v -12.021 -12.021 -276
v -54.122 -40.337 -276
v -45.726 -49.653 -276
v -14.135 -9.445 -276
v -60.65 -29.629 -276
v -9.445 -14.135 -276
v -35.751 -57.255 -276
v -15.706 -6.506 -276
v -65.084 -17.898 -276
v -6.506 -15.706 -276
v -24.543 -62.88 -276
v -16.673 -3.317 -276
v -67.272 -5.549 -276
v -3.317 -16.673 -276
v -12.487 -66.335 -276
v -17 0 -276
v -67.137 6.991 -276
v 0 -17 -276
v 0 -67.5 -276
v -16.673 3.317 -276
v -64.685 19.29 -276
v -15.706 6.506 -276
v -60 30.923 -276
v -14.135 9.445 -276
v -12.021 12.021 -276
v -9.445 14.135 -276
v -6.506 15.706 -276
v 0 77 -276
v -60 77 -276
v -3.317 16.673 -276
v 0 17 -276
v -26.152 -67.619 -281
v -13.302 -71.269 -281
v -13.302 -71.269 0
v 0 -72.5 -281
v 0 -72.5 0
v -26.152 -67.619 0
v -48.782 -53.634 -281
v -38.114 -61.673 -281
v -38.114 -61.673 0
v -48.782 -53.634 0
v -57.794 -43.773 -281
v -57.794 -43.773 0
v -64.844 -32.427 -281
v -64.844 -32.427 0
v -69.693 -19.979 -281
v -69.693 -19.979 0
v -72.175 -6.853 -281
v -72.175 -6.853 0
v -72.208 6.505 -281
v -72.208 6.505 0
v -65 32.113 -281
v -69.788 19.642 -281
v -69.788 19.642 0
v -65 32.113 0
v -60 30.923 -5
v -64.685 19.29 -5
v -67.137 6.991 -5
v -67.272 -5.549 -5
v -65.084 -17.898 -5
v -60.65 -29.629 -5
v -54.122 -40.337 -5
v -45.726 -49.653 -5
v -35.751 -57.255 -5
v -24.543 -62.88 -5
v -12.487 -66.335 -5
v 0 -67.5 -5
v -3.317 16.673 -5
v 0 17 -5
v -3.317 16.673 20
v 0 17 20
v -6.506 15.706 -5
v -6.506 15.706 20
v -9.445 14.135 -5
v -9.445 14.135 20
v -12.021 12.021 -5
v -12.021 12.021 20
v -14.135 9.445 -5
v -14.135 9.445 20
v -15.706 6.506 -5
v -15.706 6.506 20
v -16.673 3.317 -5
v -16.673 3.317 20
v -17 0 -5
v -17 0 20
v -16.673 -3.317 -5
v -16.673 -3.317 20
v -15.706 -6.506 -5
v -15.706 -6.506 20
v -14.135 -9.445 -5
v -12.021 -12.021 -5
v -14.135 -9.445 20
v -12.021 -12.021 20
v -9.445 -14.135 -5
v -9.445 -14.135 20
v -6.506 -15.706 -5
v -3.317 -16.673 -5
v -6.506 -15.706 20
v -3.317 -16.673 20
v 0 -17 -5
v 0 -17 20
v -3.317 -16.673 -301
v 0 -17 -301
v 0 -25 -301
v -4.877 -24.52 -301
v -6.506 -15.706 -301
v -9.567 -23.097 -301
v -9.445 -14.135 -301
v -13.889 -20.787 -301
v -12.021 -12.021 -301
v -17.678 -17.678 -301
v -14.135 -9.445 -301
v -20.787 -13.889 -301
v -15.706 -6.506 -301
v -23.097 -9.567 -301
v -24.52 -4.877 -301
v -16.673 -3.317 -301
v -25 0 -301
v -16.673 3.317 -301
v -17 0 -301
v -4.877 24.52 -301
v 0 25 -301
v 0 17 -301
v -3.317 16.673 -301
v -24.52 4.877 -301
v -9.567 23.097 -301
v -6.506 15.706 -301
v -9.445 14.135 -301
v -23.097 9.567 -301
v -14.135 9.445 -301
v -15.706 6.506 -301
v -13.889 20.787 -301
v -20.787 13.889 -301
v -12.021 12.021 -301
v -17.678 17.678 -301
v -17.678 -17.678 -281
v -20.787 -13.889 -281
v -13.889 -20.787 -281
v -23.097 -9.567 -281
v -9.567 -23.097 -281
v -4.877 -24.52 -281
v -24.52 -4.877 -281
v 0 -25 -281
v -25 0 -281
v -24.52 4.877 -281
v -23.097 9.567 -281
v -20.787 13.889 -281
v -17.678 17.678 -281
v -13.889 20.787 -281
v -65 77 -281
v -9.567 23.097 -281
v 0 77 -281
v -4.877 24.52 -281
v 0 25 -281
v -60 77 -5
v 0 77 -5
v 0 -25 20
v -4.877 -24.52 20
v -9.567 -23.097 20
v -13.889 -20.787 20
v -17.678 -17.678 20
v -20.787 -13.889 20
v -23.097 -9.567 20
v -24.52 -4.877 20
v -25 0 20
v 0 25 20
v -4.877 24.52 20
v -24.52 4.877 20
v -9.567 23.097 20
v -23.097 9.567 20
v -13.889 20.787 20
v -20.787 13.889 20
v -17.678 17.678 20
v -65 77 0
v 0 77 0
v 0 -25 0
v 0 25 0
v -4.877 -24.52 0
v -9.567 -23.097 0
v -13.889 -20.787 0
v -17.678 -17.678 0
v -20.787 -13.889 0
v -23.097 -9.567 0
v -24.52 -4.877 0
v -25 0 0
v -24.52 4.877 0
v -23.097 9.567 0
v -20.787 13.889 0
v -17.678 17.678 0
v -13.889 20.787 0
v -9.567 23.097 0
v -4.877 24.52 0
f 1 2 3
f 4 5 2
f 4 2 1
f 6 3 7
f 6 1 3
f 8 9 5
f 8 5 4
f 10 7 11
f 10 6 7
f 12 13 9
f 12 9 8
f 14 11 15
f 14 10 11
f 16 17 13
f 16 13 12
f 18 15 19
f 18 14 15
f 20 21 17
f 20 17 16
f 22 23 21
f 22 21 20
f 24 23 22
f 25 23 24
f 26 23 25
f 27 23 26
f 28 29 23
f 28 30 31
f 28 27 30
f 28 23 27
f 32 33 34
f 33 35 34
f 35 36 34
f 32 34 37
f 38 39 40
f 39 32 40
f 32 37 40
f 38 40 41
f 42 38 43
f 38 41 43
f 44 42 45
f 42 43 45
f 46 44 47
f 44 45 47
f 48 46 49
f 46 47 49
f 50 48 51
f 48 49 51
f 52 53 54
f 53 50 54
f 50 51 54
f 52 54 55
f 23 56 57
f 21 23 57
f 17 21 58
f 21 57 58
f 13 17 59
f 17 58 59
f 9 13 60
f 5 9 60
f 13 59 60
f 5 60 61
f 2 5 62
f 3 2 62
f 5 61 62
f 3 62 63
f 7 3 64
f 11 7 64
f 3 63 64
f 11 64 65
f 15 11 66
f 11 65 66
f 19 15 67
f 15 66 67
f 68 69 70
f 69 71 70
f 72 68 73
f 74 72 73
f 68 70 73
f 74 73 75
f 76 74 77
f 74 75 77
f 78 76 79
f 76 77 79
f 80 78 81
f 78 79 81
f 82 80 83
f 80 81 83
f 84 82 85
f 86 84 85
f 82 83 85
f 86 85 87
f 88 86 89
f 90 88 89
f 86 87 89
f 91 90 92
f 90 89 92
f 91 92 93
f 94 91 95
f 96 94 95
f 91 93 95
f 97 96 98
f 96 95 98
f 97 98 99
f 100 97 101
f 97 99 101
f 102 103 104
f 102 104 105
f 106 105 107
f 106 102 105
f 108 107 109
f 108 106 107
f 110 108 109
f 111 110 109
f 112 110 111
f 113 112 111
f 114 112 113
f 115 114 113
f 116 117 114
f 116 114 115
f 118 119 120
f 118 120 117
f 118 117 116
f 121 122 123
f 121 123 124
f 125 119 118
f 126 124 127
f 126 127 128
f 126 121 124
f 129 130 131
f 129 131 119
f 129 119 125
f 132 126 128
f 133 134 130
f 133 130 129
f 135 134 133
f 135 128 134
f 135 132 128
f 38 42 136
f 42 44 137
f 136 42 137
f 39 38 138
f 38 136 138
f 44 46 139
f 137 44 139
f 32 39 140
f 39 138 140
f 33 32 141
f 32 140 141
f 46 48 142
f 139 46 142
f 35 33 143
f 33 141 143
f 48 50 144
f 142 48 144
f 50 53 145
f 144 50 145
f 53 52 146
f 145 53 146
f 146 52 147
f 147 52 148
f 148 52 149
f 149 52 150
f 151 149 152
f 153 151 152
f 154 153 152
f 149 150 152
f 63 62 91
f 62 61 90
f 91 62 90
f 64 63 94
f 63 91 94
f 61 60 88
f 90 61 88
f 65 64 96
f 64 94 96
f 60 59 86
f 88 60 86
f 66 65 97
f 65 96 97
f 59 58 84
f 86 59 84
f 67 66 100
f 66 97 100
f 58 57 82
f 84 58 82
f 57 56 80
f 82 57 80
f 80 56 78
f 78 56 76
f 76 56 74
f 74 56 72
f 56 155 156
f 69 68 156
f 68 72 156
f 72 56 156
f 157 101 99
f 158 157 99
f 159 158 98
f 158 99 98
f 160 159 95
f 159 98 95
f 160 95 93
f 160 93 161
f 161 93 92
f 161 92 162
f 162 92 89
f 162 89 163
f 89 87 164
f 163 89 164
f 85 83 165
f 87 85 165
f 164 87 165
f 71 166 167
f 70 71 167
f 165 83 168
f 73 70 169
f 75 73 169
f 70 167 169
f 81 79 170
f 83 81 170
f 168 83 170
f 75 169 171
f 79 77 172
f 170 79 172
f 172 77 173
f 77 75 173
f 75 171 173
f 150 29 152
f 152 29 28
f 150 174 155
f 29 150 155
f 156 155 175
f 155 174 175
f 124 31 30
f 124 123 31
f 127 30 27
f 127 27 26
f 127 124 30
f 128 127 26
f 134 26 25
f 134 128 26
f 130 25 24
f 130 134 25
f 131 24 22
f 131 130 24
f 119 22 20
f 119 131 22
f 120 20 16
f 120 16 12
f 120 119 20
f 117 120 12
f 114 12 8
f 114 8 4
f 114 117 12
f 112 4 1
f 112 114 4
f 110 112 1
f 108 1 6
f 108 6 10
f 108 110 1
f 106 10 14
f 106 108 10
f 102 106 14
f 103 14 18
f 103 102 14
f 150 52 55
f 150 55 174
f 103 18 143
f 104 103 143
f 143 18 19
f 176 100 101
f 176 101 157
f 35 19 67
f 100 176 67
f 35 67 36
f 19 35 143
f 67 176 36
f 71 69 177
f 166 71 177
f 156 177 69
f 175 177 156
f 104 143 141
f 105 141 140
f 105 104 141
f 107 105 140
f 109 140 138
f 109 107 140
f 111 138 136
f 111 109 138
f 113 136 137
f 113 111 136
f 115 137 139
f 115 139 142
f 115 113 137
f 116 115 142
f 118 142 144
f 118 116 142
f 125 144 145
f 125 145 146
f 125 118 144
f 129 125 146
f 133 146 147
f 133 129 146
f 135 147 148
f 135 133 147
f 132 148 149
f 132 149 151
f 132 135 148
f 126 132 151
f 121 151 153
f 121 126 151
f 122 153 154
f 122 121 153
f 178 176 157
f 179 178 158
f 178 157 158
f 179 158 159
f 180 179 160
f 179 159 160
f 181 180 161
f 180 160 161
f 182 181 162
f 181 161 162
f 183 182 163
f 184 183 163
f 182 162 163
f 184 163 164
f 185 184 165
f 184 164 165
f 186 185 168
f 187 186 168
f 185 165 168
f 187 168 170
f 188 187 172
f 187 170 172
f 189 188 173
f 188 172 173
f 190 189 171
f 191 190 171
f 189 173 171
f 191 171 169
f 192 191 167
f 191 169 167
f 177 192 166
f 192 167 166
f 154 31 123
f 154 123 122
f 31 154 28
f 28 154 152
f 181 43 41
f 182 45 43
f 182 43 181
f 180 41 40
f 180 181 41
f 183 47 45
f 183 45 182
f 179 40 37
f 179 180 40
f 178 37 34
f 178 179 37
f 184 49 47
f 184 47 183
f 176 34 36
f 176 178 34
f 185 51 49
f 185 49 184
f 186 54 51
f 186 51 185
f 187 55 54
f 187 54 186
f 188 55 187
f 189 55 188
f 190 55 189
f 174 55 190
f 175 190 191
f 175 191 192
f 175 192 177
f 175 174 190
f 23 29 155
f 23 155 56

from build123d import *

# Parameters (mm, degrees)
BOSS_EXTRUDE1_DEPTH      = 20
BOSS_EXTRUDE1_DEPTH_BACK = 5
BOSS_EXTRUDE2_DEPTH      = 5
BOSS_EXTRUDE3_DEPTH      = 271


with BuildPart() as part:
    # Sketch1 → Boss-Extrude1 (new body, two sides)
    with BuildSketch(Plane.XY) as boss_extrude1_sk:
        with BuildLine():
            Line((0, 25), (0, 17))
            ThreePointArc((0, 17), (-17, 0), (0, -17))
            Line((0, -17), (0, -25))
            ThreePointArc((0, -25), (-25, 0), (0, 25))
        make_face()
    extrude(amount=BOSS_EXTRUDE1_DEPTH)
    extrude(boss_extrude1_sk.sketch, amount=-BOSS_EXTRUDE1_DEPTH_BACK)

    # Sketch2 → Boss-Extrude2 (add)
    with BuildSketch(Plane.XY):
        with BuildLine():
            Line((0, 25), (0, 77))
            Line((0, 77), (-65, 77))
            Line((-65, 77), (-65, 32.113081447))
            ThreePointArc((-65, 32.113081447), (-61.581037686, -38.262590053), (0, -72.5))
            Line((0, -72.5), (0, -25))
            ThreePointArc((0, -25), (-25, 0), (0, 25))
        make_face()
    extrude(amount=-BOSS_EXTRUDE2_DEPTH)


with BuildPart() as body_2:
    # Mirror2: mirrored copy
    add(part.part.mirror(Plane.XY.offset(-140.5)))


with BuildPart() as part_1:
    add(part.part)

    add(body_2.part)  # Boss-Extrude3 merges body 2
    # Sketch3 → Boss-Extrude3 (add)
    with BuildSketch(Plane(origin=(0, 0, -5), x_dir=(-1, 0, 0), z_dir=(0, 0, -1))):
        with BuildLine():
            Line((60, 77), (60, 30.923292192))
            ThreePointArc((60, 30.923292192), (57.634938288, -35.134938288), (0, -67.5))
            Line((0, -67.5), (0, -72.5))
            ThreePointArc((0, -72.5), (61.581037686, -38.262590053), (65, 32.113081447))
            Line((65, 32.113081447), (65, 77))
            Line((65, 77), (60, 77))
        make_face()
    extrude(amount=BOSS_EXTRUDE3_DEPTH)


solid = part_1.part
